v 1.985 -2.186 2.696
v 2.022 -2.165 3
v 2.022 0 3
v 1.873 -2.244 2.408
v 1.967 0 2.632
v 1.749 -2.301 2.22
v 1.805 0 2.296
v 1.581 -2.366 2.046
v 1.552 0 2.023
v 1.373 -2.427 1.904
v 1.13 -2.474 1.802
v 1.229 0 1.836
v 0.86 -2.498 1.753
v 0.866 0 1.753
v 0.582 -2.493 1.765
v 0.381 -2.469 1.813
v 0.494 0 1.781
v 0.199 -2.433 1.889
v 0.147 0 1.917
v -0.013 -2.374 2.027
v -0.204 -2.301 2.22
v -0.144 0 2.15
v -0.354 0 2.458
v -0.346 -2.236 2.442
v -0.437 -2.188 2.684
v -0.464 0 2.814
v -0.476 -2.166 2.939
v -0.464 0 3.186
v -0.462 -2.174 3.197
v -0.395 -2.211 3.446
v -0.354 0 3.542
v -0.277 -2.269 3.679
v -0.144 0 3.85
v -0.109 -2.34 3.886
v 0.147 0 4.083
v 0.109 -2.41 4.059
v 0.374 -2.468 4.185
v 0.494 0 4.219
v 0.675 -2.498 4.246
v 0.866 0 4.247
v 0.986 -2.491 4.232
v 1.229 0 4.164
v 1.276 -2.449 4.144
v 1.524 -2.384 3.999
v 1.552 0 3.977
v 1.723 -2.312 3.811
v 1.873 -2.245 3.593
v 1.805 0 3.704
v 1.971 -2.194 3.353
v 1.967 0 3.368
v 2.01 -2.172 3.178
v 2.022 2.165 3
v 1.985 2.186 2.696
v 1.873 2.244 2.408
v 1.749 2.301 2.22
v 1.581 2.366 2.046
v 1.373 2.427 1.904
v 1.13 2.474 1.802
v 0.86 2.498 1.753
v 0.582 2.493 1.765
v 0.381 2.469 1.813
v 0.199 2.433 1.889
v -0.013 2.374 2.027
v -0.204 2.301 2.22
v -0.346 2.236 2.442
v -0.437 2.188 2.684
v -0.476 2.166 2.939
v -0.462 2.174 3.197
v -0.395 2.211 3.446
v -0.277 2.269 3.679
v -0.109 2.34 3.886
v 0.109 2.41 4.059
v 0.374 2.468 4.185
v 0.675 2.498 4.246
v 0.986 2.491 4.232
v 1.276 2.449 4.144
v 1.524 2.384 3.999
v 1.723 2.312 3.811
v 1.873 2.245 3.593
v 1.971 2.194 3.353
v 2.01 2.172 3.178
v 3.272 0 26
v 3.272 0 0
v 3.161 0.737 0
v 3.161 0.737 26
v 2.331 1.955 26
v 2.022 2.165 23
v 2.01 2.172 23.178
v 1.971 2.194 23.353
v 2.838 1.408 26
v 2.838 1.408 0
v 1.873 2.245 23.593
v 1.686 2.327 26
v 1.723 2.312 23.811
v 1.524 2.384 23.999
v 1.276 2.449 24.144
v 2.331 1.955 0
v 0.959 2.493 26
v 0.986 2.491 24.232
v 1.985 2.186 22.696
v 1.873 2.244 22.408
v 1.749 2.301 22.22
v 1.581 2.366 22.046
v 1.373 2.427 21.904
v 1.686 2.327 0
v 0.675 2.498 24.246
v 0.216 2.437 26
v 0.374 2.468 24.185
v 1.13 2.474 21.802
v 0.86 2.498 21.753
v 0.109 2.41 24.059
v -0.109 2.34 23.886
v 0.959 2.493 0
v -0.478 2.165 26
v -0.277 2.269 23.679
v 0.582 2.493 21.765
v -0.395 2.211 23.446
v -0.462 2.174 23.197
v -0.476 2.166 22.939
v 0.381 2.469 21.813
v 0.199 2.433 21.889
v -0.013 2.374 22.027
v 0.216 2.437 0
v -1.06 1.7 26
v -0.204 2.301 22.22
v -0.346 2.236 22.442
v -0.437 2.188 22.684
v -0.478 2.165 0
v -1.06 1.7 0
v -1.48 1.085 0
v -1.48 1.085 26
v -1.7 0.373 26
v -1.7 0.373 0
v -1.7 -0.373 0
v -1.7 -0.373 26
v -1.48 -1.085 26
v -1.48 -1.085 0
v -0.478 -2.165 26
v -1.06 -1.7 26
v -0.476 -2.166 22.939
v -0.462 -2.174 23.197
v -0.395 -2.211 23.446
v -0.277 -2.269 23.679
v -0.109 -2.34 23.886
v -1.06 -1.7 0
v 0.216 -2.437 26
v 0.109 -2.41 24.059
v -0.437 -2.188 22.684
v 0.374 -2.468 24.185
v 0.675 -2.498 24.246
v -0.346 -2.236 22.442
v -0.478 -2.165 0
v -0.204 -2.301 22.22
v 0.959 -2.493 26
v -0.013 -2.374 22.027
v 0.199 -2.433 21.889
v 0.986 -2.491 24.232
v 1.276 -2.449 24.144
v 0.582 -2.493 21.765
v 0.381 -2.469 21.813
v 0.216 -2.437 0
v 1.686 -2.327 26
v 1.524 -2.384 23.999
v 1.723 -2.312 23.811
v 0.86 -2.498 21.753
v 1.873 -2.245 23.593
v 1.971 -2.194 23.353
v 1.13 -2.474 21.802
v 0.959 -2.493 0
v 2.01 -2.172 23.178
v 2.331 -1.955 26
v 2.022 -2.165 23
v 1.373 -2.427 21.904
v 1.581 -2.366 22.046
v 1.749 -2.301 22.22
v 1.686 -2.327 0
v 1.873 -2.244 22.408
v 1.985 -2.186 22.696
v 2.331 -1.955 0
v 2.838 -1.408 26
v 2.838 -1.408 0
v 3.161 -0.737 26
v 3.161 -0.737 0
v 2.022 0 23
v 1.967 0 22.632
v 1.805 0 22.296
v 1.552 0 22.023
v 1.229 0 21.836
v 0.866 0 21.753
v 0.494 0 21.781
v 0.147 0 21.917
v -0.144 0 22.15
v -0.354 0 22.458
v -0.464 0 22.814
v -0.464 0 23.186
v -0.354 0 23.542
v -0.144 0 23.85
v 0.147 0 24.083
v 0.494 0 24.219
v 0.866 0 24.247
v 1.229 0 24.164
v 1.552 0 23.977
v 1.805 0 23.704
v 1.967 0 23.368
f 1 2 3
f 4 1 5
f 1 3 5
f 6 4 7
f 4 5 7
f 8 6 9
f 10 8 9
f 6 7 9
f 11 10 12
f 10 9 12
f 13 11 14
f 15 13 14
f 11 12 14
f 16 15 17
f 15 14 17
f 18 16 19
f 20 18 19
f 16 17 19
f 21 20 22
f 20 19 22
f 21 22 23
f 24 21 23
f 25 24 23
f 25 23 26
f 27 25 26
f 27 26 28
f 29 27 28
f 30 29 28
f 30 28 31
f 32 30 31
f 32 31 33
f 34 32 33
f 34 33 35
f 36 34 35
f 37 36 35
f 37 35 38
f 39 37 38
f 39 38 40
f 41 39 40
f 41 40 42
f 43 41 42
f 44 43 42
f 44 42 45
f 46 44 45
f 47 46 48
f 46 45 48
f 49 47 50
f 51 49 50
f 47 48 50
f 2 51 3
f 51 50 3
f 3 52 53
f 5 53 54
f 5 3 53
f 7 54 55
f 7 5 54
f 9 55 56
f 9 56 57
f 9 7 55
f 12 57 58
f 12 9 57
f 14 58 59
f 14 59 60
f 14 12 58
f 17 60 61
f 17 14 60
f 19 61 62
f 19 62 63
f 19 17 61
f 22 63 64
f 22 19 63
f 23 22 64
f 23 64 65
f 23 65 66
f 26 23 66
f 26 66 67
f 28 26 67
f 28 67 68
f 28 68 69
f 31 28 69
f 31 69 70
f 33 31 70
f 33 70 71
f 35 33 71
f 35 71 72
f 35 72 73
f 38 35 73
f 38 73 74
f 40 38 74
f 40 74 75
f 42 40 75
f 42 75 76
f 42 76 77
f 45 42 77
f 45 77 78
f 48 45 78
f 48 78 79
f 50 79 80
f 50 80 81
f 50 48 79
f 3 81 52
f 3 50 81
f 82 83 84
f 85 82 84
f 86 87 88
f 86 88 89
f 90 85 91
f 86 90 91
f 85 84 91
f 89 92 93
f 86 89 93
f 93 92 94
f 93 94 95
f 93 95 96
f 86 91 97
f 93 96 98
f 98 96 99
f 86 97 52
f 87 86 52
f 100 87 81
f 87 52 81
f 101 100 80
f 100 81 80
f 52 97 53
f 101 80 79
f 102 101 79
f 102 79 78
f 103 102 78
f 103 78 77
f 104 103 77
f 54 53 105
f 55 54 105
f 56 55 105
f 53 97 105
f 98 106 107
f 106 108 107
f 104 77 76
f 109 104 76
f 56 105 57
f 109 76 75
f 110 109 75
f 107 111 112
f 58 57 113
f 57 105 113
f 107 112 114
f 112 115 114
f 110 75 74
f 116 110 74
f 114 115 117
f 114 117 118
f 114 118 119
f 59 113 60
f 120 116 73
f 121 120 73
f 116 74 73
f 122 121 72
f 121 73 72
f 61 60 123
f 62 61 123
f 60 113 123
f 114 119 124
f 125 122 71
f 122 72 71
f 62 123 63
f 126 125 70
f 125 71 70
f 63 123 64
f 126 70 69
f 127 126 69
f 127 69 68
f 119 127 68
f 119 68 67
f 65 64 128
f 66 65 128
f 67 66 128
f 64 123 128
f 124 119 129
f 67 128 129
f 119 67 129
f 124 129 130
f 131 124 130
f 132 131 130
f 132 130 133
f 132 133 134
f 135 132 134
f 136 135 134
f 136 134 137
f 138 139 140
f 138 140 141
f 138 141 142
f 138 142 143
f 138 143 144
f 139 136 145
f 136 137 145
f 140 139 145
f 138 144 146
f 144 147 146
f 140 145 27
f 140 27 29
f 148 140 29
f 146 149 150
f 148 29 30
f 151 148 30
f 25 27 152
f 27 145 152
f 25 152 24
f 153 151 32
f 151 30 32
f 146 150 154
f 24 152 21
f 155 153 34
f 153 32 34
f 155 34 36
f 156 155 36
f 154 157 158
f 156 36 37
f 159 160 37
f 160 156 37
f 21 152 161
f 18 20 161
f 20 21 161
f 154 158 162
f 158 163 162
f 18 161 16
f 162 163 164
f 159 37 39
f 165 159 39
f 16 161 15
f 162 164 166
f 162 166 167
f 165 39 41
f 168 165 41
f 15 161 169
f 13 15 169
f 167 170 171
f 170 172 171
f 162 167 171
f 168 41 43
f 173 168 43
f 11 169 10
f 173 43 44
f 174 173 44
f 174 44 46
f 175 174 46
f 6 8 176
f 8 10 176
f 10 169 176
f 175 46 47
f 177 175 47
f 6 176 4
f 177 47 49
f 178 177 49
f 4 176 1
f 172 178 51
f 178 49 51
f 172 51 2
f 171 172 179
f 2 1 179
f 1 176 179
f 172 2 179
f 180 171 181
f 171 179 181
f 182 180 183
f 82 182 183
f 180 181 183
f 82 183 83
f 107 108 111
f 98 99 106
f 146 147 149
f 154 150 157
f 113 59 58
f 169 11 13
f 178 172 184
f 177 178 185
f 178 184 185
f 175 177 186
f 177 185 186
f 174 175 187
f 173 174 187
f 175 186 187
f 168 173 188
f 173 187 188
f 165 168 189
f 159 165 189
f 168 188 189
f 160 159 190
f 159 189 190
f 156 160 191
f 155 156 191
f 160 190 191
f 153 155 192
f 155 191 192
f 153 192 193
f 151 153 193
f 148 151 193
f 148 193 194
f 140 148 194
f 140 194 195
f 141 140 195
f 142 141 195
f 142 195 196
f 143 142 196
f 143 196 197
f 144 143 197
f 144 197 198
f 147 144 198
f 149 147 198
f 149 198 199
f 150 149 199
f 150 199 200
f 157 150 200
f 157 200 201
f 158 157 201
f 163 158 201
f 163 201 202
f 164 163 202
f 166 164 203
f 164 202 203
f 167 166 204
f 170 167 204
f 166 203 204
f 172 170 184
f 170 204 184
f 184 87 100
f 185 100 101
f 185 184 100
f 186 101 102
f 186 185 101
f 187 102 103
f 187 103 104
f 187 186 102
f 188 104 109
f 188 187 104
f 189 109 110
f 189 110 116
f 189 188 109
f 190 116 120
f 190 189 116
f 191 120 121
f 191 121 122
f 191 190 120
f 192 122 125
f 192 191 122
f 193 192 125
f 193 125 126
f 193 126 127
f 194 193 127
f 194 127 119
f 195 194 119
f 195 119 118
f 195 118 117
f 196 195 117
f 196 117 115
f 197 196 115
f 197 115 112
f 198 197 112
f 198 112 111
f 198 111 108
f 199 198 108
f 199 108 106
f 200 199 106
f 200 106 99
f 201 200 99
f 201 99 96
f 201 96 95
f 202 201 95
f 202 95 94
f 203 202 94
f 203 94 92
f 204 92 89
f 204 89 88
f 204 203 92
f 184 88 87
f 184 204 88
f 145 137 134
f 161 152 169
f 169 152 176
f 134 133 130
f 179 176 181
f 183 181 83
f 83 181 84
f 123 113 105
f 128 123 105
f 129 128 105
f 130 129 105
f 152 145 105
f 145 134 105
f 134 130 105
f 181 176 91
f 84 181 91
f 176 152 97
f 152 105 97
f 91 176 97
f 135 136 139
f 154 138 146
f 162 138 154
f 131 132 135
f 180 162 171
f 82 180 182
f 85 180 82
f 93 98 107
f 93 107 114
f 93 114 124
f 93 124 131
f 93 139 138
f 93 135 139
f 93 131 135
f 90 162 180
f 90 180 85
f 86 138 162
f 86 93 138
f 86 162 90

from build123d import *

# Parameters (mm, degrees)
SKETCH1_R               = 2.5
BOSS_EXTRUDE1_DEPTH     = 26
SKETCH2_R               = 1.25
CUT_EXTRUDE1_DEPTH      = 3.5
CUT_EXTRUDE1_DEPTH_BACK = 3.5


with BuildPart() as part:
    # Sketch1 → Boss-Extrude1 (new body)
    with BuildSketch(Plane.XY):
        with Locations((0.77230809, 0)):
            Circle(SKETCH1_R)
    extrude(amount=BOSS_EXTRUDE1_DEPTH)

    # Sketch2 → Cut-Extrude1 (cut, two sides)
    with BuildSketch(Plane(origin=(0, 0, 0), x_dir=(1, 0, 0), z_dir=(0, 1, 0))) as cut_extrude1_sk:
        with Locations((0.77230809, -3)):
            Circle(SKETCH2_R)
        with Locations((0.77230809, -23)):
            Circle(SKETCH2_R)
    extrude(amount=CUT_EXTRUDE1_DEPTH, mode=Mode.SUBTRACT)
    extrude(cut_extrude1_sk.sketch, amount=-CUT_EXTRUDE1_DEPTH_BACK, mode=Mode.SUBTRACT)


solid = part.part
